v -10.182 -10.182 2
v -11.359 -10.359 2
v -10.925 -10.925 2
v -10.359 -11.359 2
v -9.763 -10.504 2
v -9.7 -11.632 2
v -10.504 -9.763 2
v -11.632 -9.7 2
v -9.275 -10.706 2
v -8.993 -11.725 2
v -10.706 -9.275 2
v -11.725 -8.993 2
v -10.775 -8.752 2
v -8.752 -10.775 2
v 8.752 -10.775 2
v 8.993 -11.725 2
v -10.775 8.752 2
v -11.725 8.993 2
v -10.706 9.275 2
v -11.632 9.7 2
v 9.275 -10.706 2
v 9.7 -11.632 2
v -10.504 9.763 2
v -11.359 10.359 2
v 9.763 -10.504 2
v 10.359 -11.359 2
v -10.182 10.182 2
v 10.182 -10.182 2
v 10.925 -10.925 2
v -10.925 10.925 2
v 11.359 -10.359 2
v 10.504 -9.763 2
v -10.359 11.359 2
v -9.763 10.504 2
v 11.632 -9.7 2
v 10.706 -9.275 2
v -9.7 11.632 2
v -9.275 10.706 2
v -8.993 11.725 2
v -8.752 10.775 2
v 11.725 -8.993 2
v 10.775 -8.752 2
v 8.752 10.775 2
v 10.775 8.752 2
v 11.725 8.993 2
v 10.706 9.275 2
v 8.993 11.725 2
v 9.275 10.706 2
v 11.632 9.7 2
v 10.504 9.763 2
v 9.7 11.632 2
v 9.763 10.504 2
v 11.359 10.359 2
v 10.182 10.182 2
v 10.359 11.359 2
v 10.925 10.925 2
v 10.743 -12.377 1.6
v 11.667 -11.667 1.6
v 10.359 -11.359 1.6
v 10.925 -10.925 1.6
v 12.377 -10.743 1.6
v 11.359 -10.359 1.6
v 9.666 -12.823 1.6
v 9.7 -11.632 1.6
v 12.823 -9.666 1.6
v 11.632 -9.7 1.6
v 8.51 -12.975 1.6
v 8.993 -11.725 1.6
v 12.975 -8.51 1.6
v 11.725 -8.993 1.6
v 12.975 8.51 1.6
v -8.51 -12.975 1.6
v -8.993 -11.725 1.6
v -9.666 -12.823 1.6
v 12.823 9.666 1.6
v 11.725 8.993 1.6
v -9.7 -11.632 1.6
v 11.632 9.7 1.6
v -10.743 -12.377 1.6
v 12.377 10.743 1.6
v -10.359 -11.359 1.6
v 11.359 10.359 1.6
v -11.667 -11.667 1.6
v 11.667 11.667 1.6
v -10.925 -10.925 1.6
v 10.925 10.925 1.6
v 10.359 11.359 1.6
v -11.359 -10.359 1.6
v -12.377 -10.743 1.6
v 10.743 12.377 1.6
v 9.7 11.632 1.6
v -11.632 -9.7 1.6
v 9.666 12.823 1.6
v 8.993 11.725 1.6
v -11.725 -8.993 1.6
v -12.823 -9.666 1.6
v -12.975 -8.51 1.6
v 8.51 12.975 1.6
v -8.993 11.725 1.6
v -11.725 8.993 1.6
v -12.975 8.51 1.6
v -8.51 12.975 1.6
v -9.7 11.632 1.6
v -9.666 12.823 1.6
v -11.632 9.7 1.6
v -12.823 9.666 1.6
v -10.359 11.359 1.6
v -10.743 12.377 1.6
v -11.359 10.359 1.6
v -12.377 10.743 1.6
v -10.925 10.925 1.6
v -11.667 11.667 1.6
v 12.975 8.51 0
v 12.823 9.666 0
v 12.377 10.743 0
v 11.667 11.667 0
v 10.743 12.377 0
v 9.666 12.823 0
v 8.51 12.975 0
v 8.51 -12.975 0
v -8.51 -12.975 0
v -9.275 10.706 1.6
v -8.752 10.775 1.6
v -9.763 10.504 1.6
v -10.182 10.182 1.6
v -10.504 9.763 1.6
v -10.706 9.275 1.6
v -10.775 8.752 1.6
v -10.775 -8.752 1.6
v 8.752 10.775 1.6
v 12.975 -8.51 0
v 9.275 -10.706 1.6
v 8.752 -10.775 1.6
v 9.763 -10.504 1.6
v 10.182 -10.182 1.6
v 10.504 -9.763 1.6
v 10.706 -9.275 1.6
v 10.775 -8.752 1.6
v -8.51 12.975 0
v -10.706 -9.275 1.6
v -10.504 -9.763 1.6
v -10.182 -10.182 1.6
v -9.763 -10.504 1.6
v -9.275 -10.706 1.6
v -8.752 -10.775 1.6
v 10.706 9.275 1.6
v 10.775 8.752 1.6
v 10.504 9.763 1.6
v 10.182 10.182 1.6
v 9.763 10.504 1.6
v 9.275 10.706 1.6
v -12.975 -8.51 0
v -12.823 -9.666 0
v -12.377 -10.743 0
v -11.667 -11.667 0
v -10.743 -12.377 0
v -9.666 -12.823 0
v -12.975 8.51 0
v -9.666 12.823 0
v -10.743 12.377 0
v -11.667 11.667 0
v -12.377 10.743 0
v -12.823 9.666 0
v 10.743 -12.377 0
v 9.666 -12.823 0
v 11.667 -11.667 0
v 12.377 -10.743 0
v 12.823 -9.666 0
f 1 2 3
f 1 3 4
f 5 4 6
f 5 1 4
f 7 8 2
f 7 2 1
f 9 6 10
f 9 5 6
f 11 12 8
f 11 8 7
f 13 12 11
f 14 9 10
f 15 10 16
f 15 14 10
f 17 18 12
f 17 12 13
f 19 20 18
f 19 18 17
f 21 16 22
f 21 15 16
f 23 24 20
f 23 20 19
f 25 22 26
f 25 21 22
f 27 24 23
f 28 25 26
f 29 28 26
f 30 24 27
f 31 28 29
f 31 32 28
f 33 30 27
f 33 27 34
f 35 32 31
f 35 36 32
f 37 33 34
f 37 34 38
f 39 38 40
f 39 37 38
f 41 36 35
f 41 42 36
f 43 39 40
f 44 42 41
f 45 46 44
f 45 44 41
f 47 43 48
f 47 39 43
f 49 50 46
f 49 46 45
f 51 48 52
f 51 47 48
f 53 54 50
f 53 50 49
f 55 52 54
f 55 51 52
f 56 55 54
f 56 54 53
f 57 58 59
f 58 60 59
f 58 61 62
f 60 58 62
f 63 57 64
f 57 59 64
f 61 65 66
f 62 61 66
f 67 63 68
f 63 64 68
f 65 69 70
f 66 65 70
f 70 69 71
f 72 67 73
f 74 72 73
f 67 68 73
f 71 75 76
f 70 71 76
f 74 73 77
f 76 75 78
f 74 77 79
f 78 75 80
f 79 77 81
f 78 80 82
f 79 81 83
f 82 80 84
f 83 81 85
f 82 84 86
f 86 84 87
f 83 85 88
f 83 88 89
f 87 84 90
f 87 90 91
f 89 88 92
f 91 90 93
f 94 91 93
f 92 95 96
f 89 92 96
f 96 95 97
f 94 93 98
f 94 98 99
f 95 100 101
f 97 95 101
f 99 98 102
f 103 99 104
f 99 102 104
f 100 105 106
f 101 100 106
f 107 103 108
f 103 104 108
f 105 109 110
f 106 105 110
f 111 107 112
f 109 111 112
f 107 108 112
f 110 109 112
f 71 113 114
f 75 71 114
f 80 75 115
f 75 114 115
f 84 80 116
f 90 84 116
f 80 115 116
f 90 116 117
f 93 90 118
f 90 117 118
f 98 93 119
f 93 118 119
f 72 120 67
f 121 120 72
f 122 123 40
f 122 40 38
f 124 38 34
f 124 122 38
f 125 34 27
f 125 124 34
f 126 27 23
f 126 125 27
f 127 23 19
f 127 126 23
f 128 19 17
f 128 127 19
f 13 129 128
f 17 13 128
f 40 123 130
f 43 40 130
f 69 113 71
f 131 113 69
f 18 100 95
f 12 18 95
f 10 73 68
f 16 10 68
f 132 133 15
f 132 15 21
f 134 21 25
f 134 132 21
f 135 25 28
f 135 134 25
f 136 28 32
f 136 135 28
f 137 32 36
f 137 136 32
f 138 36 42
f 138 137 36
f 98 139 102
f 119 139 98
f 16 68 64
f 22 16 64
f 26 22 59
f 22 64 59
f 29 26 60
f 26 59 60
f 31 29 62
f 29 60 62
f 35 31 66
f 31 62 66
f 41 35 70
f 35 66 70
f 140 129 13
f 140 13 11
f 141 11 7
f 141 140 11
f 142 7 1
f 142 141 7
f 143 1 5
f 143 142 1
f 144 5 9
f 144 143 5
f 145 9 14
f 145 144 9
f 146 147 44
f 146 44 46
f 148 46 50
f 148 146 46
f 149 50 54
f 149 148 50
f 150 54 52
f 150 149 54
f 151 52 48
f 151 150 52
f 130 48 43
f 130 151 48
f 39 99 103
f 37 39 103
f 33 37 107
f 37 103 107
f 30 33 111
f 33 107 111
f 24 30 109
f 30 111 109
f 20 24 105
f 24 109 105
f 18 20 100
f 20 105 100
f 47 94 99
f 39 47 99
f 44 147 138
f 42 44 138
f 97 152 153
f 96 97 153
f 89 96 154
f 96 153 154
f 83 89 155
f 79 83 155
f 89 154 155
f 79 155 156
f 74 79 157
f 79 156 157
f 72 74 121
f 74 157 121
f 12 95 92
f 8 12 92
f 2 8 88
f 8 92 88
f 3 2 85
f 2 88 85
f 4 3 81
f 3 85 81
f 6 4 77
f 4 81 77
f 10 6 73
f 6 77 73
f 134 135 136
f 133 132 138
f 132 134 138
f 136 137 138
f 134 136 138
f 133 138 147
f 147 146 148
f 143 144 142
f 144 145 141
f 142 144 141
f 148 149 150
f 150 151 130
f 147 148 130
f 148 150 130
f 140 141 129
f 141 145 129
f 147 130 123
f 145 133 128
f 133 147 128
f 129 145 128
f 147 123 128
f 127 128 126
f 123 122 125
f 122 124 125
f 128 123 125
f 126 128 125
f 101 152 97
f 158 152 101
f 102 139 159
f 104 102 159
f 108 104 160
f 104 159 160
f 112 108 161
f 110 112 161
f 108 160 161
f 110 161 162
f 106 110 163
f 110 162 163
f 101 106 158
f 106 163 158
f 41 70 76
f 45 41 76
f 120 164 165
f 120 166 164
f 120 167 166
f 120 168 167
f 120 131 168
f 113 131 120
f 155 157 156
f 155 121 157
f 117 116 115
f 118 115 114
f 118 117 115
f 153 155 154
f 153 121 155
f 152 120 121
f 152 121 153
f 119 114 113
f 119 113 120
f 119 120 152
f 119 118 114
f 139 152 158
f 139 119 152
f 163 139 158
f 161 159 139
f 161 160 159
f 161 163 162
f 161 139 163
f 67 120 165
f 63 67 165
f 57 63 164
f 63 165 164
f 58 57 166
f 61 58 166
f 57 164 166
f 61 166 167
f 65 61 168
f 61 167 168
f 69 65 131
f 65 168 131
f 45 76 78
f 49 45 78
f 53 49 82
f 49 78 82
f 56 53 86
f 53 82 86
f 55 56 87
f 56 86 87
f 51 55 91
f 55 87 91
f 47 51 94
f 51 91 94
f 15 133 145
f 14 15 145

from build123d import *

# Parameters (mm, degrees)
PAD_DEPTH    = 1.6
PAD001_DEPTH = 0.4


with BuildPart() as part:
    # Sketch → Pad (new body)
    with BuildSketch(Plane.XY):
        with BuildLine():
            Line((-8.510103, 12.975), (8.510103, 12.975))
            ThreePointArc((12.975, 8.510103), (11.667262, 11.667262), (8.510103, 12.975))
            Line((12.975, 8.510103), (12.975, -8.510103))
            ThreePointArc((8.510103, -12.975), (11.667262, -11.667262), (12.975, -8.510103))
            Line((8.510103, -12.975), (-8.510103, -12.975))
            ThreePointArc((-12.975, -8.510103), (-11.667262, -11.667262), (-8.510103, -12.975))
            Line((-12.975, -8.510103), (-12.975, 8.510103))
            ThreePointArc((-8.510103, 12.975), (-11.667262, 11.667262), (-12.975, 8.510103))
        make_face()
    extrude(amount=PAD_DEPTH)

    # Sketch001 (on Face10 of Pad) → Pad001 (join)
    with BuildSketch(Plane.XY.offset(1.6)):
        with BuildLine():
            Line((-11.725, 8.992951), (-11.725, -8.99294))
            ThreePointArc((-11.725, -8.99294), (-10.924798, -10.924798), (-8.99294, -11.725))
            Line((-8.99294, -11.725), (8.992951, -11.725))
            ThreePointArc((8.992951, -11.725), (10.924802, -10.924795), (11.725, -8.99294))
            Line((11.725, -8.99294), (11.725, 8.992951))
            ThreePointArc((11.725, 8.992951), (10.924801, 10.924801), (8.992951, 11.725))
            Line((8.992951, 11.725), (-8.99294, 11.725))
            ThreePointArc((-8.99294, 11.725), (-10.924798, 10.924805), (-11.725, 8.992951))
        make_face()
        with BuildLine():
            Line((-8.751524, 10.775), (8.751524, 10.775))
            ThreePointArc((10.775, 8.751524), (10.182338, 10.182338), (8.751524, 10.775))
            Line((10.775, 8.751524), (10.775, -8.751524))
            ThreePointArc((8.751524, -10.775), (10.182338, -10.182338), (10.775, -8.751524))
            Line((8.751524, -10.775), (-8.751524, -10.775))
            ThreePointArc((-10.775, -8.751524), (-10.182338, -10.182338), (-8.751524, -10.775))
            Line((-10.775, -8.751524), (-10.775, 8.751524))
            ThreePointArc((-8.751524, 10.775), (-10.182338, 10.182338), (-10.775, 8.751524))
        make_face(mode=Mode.SUBTRACT)
    extrude(amount=PAD001_DEPTH)


solid = part.part
